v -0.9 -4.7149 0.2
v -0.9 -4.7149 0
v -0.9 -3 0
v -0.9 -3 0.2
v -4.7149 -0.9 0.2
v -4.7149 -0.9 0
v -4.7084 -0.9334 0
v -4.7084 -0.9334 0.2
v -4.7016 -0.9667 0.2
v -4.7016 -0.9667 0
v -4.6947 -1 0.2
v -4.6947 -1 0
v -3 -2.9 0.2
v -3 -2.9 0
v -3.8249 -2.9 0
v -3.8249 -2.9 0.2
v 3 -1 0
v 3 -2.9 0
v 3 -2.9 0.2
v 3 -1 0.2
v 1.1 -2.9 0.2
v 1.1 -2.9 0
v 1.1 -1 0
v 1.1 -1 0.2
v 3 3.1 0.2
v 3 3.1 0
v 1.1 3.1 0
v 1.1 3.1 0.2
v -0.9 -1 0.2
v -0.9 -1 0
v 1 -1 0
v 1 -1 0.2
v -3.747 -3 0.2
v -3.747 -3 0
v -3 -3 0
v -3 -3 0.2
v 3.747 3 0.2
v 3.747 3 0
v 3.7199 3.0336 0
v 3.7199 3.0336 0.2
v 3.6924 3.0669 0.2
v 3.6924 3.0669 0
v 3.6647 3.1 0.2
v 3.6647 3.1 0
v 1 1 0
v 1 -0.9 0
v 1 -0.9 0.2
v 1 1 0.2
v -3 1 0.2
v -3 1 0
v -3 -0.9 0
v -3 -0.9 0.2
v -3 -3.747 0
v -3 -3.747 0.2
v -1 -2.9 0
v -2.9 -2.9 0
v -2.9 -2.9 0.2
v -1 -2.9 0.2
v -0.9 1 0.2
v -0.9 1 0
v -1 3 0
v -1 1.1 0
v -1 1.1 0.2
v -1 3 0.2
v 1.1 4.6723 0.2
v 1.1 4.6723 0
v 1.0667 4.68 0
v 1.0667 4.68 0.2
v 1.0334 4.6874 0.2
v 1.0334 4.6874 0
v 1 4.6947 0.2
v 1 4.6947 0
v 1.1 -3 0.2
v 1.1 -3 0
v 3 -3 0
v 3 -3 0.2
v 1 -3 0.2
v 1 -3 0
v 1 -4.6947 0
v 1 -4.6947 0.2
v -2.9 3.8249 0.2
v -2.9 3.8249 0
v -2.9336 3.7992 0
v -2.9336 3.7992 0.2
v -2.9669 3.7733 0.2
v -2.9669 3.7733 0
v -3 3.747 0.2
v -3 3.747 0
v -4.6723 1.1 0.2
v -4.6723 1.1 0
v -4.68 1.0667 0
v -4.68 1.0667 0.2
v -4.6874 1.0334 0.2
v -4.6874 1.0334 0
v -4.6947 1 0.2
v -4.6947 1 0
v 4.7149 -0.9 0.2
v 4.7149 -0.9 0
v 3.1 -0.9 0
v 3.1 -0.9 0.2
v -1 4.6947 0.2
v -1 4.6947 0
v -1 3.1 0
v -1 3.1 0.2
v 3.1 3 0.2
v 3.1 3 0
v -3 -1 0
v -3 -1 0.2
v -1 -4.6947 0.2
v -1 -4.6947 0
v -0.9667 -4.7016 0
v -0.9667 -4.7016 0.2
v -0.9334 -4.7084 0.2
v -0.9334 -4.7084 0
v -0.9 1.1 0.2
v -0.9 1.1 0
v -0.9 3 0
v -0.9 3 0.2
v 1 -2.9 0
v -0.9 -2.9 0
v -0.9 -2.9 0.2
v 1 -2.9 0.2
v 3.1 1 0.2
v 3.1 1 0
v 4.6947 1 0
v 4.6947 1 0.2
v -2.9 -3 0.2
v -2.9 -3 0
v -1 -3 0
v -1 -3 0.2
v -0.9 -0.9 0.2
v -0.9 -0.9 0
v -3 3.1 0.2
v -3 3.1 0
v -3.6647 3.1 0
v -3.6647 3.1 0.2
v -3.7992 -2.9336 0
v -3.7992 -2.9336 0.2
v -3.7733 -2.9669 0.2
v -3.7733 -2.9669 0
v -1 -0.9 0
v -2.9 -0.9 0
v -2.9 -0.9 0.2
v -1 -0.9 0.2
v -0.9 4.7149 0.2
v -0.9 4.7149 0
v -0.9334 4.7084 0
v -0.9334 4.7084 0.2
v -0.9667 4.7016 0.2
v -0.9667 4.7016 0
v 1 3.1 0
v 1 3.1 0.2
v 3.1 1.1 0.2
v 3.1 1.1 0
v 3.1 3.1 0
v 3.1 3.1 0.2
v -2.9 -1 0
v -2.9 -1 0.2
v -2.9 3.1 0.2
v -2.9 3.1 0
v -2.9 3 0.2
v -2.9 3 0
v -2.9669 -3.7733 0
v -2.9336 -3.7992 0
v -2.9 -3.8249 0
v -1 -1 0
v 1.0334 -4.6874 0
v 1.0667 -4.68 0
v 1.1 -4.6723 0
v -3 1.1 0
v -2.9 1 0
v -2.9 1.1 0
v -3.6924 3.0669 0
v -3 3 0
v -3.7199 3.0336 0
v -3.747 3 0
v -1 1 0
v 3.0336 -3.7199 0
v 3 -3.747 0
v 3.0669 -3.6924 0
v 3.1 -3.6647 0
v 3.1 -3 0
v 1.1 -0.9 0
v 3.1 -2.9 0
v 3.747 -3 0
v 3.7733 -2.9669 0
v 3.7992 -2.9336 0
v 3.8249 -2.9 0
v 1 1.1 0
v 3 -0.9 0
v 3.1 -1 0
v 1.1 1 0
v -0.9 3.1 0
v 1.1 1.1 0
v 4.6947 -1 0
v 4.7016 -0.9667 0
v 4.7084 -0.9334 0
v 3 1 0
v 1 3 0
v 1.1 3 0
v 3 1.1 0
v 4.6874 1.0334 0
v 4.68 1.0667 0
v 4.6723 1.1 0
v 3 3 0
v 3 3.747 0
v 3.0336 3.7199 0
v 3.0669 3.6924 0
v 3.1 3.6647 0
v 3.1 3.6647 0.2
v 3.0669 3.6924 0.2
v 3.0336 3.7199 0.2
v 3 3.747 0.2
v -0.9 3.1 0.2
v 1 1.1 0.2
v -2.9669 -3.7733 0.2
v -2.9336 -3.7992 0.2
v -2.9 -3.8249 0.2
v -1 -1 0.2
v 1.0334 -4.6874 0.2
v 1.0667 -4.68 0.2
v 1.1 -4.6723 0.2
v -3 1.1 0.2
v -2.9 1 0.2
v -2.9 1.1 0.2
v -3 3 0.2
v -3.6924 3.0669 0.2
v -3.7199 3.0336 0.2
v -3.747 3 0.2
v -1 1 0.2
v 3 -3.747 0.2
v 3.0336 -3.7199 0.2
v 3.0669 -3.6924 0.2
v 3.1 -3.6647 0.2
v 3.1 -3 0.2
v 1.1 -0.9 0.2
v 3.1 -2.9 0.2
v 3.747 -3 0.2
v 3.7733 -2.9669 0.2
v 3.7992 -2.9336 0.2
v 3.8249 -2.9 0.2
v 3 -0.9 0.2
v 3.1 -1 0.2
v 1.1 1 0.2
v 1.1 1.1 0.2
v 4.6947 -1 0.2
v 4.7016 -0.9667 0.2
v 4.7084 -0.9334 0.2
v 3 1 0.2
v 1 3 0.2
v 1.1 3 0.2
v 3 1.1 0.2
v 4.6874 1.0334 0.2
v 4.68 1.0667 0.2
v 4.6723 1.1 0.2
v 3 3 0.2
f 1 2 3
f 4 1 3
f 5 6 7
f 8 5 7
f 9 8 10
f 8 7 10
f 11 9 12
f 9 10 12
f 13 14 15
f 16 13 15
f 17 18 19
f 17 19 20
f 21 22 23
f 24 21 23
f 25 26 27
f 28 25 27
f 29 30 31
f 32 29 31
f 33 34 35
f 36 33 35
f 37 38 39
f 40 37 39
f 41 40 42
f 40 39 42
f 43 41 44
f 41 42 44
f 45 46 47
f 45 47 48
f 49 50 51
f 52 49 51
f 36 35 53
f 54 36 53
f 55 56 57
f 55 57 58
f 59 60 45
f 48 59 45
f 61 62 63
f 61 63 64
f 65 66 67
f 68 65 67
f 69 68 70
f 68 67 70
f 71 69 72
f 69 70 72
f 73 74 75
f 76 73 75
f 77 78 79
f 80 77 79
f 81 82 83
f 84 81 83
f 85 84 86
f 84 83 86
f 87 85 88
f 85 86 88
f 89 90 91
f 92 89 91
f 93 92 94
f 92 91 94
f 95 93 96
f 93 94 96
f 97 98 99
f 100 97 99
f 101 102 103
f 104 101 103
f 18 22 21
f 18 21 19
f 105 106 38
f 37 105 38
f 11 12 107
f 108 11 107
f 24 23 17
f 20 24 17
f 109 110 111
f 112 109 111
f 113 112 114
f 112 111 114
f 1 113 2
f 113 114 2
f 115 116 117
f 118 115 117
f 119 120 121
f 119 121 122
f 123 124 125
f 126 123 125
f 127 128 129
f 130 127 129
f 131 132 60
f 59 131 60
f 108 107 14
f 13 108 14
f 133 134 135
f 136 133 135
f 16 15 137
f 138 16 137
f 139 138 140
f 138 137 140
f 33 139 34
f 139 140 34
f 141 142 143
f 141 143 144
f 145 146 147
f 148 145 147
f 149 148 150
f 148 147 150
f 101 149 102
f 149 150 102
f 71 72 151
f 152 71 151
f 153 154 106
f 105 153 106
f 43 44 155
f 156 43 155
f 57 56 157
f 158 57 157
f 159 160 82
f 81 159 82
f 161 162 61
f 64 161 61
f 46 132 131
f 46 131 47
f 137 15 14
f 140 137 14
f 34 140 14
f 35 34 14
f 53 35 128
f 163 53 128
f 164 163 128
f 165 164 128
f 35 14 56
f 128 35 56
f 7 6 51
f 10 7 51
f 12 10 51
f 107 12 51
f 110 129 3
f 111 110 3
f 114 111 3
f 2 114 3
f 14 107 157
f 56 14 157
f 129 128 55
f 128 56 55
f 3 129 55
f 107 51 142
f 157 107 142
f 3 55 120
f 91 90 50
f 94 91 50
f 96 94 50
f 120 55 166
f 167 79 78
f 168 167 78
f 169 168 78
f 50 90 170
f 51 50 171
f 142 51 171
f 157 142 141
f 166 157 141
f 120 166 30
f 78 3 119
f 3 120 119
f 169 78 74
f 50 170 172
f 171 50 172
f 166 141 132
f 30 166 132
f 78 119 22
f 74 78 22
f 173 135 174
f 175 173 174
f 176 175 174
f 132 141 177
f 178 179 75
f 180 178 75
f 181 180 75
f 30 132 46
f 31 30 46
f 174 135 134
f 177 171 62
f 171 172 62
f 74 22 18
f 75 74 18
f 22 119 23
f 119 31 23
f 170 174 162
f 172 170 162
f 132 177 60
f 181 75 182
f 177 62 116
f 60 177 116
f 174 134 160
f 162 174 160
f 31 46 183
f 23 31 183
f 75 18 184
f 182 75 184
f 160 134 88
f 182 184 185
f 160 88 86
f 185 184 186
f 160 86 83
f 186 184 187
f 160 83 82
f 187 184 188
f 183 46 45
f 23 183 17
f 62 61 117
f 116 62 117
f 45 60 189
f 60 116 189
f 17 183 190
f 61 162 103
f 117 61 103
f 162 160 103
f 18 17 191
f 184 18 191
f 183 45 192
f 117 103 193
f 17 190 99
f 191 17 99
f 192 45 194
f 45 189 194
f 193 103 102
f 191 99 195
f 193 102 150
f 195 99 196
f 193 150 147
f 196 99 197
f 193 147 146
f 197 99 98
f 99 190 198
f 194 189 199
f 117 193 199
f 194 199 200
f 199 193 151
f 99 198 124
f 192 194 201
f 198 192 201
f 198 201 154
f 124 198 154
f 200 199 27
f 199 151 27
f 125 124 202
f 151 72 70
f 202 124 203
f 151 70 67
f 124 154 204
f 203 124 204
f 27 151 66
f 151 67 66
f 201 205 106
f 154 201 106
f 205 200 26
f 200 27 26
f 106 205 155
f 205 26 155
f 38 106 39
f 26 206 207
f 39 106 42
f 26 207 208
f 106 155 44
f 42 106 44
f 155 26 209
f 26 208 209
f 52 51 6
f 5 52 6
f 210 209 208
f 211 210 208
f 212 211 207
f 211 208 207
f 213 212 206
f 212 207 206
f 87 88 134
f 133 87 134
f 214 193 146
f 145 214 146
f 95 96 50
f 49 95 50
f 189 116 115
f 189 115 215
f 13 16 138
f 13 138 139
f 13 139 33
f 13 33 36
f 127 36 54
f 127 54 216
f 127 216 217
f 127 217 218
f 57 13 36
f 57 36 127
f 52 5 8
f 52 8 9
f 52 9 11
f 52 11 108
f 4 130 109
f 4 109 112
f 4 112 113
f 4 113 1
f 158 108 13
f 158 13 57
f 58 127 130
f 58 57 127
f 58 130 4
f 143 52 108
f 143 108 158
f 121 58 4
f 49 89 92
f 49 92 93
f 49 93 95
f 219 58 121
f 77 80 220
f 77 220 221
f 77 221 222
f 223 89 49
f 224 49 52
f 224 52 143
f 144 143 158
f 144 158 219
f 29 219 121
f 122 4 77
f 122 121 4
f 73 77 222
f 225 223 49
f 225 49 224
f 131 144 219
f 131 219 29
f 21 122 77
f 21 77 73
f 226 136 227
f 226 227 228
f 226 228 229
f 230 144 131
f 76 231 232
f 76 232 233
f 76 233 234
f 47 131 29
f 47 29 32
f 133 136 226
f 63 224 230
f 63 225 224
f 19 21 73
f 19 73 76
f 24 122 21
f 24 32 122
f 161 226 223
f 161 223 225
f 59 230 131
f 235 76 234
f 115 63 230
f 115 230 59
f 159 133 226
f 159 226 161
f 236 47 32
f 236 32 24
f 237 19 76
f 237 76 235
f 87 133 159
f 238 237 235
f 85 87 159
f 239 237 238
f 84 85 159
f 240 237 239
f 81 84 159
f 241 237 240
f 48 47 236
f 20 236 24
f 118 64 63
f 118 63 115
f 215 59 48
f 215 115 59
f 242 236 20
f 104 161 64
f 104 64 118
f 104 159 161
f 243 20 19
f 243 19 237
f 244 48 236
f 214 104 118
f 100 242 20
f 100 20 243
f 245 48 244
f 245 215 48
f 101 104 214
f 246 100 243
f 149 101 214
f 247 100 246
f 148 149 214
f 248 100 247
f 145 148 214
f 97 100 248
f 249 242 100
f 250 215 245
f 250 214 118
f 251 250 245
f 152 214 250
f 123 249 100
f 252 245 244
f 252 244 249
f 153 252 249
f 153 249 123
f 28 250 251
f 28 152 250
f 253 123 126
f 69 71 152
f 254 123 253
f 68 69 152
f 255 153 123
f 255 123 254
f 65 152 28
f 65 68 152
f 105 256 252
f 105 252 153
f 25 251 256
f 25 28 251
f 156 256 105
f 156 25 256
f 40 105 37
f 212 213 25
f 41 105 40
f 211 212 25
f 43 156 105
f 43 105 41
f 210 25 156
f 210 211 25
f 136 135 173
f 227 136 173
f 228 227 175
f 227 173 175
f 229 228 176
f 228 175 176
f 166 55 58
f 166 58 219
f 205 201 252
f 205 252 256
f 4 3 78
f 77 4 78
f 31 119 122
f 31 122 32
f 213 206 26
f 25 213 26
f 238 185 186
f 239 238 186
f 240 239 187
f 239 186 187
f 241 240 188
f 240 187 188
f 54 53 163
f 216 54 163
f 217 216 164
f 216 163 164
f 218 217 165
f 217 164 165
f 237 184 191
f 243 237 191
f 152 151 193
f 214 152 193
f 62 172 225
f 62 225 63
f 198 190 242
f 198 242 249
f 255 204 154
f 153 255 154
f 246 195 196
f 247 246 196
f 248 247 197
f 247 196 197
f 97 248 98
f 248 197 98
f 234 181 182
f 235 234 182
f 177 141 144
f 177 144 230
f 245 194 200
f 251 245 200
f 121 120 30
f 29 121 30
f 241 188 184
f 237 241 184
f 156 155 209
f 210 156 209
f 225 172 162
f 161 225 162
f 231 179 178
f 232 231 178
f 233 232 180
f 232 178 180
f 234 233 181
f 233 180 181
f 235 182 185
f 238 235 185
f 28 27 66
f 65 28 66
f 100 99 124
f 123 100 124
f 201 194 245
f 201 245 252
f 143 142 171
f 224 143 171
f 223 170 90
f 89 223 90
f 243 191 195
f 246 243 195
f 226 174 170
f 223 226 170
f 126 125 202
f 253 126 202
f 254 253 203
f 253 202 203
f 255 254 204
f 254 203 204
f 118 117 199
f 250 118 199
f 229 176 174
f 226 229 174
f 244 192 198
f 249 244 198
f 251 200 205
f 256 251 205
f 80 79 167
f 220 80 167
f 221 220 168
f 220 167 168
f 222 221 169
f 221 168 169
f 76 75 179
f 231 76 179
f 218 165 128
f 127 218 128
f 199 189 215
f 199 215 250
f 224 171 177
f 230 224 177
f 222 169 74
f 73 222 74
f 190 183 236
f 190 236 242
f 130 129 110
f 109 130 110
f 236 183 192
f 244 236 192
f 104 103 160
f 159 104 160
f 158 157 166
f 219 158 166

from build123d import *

# Parameters (mm, degrees)
F0_W     = 1.9
F0_H     = 1.9
F1_DEPTH = 0.2


with BuildPart() as f1:
    # F0 (on Top) → F1 (new body)
    with BuildSketch(Plane.XY):
        with BuildLine():
            ThreePointArc((-2.9, 3.824918), (-2.950257, 3.786289), (-3, 3.746999))
            Line((-3, 3.746999), (-3, 3.1))
            Line((-3, 3.1), (-3.664696, 3.1))
            ThreePointArc((-3.664696, 3.1), (-3.706185, 3.050278), (-3.746999, 3))
            Line((-3.746999, 3), (-3, 3))
            Line((-3, 3), (-3, 1.1))
            Line((-3, 1.1), (-4.672259, 1.1))
            ThreePointArc((-4.672259, 1.1), (-4.683735, 1.05006), (-4.694678, 1))
            Line((-4.694678, 1), (-3, 1))
            Line((-3, 1), (-3, -0.9))
            Line((-3, -0.9), (-4.71487, -0.9))
            ThreePointArc((-4.71487, -0.9), (-4.70504, -0.950054), (-4.694678, -1))
            Line((-4.694678, -1), (-3, -1))
            Line((-3, -1), (-3, -2.9))
            Line((-3, -2.9), (-3.824918, -2.9))
            ThreePointArc((-3.824918, -2.9), (-3.786289, -2.950257), (-3.746999, -3))
            Line((-3.746999, -3), (-3, -3))
            Line((-3, -3), (-3, -3.746999))
            ThreePointArc((-3, -3.746999), (-2.950257, -3.786289), (-2.9, -3.824918))
            Line((-2.9, -3.824918), (-2.9, -3))
            Line((-2.9, -3), (-1, -3))
            Line((-1, -3), (-1, -4.694678))
            ThreePointArc((-1, -4.694678), (-0.950054, -4.70504), (-0.9, -4.71487))
            Line((-0.9, -4.71487), (-0.9, -3))
            Line((-0.9, -3), (1, -3))
            Line((1, -3), (1, -4.694678))
            ThreePointArc((1, -4.694678), (1.05006, -4.683735), (1.1, -4.672259))
            Line((1.1, -4.672259), (1.1, -3))
            Line((1.1, -3), (3, -3))
            Line((3, -3), (3, -3.746999))
            ThreePointArc((3, -3.746999), (3.050278, -3.706185), (3.1, -3.664696))
            Line((3.1, -3.664696), (3.1, -3))
            Line((3.1, -3), (3.746999, -3))
            ThreePointArc((3.746999, -3), (3.786289, -2.950257), (3.824918, -2.9))
            Line((3.824918, -2.9), (3.1, -2.9))
            Line((3.1, -2.9), (3.1, -1))
            Line((3.1, -1), (4.694678, -1))
            ThreePointArc((4.694678, -1), (4.70504, -0.950054), (4.71487, -0.9))
            Line((4.71487, -0.9), (3.1, -0.9))
            Line((3.1, -0.9), (3.1, 1))
            Line((3.1, 1), (4.694678, 1))
            ThreePointArc((4.694678, 1), (4.683735, 1.05006), (4.672259, 1.1))
            Line((4.672259, 1.1), (3.1, 1.1))
            Line((3.1, 1.1), (3.1, 3))
            Line((3.1, 3), (3.746999, 3))
            ThreePointArc((3.746999, 3), (3.706185, 3.050278), (3.664696, 3.1))
            Line((3.664696, 3.1), (3.1, 3.1))
            Line((3.1, 3.1), (3.1, 3.664696))
            ThreePointArc((3.1, 3.664696), (3.050278, 3.706185), (3, 3.746999))
            Line((3, 3.746999), (3, 3.1))
            Line((3, 3.1), (1.1, 3.1))
            Line((1.1, 3.1), (1.1, 4.672259))
            ThreePointArc((1.1, 4.672259), (1.05006, 4.683735), (1, 4.694678))
            Line((1, 4.694678), (1, 3.1))
            Line((1, 3.1), (-0.9, 3.1))
            Line((-0.9, 3.1), (-0.9, 4.71487))
            ThreePointArc((-0.9, 4.71487), (-0.950054, 4.70504), (-1, 4.694678))
            Line((-1, 4.694678), (-1, 3.1))
            Line((-1, 3.1), (-2.9, 3.1))
            Line((-2.9, 3.1), (-2.9, 3.824918))
        make_face()
        with Locations((-1.95, -1.95)):
            Rectangle(F0_W, F0_H, mode=Mode.SUBTRACT)
        with Locations((0.05, -1.95)):
            Rectangle(F0_W, F0_H, mode=Mode.SUBTRACT)
        with Locations((2.05, -1.95)):
            Rectangle(F0_W, F0_H, mode=Mode.SUBTRACT)
        with Locations((-1.95, 0.05)):
            Rectangle(F0_W, F0_H, mode=Mode.SUBTRACT)
        with Locations((-1.95, 2.05)):
            Rectangle(F0_W, F0_H, mode=Mode.SUBTRACT)
        with Locations((0.05, 0.05)):
            Rectangle(F0_W, F0_H, mode=Mode.SUBTRACT)
        with Locations((2.05, 0.05)):
            Rectangle(F0_W, F0_H, mode=Mode.SUBTRACT)
        with Locations((0.05, 2.05)):
            Rectangle(F0_W, F0_H, mode=Mode.SUBTRACT)
        with Locations((2.05, 2.05)):
            Rectangle(F0_W, F0_H, mode=Mode.SUBTRACT)
    extrude(amount=F1_DEPTH)


solid = f1.part
